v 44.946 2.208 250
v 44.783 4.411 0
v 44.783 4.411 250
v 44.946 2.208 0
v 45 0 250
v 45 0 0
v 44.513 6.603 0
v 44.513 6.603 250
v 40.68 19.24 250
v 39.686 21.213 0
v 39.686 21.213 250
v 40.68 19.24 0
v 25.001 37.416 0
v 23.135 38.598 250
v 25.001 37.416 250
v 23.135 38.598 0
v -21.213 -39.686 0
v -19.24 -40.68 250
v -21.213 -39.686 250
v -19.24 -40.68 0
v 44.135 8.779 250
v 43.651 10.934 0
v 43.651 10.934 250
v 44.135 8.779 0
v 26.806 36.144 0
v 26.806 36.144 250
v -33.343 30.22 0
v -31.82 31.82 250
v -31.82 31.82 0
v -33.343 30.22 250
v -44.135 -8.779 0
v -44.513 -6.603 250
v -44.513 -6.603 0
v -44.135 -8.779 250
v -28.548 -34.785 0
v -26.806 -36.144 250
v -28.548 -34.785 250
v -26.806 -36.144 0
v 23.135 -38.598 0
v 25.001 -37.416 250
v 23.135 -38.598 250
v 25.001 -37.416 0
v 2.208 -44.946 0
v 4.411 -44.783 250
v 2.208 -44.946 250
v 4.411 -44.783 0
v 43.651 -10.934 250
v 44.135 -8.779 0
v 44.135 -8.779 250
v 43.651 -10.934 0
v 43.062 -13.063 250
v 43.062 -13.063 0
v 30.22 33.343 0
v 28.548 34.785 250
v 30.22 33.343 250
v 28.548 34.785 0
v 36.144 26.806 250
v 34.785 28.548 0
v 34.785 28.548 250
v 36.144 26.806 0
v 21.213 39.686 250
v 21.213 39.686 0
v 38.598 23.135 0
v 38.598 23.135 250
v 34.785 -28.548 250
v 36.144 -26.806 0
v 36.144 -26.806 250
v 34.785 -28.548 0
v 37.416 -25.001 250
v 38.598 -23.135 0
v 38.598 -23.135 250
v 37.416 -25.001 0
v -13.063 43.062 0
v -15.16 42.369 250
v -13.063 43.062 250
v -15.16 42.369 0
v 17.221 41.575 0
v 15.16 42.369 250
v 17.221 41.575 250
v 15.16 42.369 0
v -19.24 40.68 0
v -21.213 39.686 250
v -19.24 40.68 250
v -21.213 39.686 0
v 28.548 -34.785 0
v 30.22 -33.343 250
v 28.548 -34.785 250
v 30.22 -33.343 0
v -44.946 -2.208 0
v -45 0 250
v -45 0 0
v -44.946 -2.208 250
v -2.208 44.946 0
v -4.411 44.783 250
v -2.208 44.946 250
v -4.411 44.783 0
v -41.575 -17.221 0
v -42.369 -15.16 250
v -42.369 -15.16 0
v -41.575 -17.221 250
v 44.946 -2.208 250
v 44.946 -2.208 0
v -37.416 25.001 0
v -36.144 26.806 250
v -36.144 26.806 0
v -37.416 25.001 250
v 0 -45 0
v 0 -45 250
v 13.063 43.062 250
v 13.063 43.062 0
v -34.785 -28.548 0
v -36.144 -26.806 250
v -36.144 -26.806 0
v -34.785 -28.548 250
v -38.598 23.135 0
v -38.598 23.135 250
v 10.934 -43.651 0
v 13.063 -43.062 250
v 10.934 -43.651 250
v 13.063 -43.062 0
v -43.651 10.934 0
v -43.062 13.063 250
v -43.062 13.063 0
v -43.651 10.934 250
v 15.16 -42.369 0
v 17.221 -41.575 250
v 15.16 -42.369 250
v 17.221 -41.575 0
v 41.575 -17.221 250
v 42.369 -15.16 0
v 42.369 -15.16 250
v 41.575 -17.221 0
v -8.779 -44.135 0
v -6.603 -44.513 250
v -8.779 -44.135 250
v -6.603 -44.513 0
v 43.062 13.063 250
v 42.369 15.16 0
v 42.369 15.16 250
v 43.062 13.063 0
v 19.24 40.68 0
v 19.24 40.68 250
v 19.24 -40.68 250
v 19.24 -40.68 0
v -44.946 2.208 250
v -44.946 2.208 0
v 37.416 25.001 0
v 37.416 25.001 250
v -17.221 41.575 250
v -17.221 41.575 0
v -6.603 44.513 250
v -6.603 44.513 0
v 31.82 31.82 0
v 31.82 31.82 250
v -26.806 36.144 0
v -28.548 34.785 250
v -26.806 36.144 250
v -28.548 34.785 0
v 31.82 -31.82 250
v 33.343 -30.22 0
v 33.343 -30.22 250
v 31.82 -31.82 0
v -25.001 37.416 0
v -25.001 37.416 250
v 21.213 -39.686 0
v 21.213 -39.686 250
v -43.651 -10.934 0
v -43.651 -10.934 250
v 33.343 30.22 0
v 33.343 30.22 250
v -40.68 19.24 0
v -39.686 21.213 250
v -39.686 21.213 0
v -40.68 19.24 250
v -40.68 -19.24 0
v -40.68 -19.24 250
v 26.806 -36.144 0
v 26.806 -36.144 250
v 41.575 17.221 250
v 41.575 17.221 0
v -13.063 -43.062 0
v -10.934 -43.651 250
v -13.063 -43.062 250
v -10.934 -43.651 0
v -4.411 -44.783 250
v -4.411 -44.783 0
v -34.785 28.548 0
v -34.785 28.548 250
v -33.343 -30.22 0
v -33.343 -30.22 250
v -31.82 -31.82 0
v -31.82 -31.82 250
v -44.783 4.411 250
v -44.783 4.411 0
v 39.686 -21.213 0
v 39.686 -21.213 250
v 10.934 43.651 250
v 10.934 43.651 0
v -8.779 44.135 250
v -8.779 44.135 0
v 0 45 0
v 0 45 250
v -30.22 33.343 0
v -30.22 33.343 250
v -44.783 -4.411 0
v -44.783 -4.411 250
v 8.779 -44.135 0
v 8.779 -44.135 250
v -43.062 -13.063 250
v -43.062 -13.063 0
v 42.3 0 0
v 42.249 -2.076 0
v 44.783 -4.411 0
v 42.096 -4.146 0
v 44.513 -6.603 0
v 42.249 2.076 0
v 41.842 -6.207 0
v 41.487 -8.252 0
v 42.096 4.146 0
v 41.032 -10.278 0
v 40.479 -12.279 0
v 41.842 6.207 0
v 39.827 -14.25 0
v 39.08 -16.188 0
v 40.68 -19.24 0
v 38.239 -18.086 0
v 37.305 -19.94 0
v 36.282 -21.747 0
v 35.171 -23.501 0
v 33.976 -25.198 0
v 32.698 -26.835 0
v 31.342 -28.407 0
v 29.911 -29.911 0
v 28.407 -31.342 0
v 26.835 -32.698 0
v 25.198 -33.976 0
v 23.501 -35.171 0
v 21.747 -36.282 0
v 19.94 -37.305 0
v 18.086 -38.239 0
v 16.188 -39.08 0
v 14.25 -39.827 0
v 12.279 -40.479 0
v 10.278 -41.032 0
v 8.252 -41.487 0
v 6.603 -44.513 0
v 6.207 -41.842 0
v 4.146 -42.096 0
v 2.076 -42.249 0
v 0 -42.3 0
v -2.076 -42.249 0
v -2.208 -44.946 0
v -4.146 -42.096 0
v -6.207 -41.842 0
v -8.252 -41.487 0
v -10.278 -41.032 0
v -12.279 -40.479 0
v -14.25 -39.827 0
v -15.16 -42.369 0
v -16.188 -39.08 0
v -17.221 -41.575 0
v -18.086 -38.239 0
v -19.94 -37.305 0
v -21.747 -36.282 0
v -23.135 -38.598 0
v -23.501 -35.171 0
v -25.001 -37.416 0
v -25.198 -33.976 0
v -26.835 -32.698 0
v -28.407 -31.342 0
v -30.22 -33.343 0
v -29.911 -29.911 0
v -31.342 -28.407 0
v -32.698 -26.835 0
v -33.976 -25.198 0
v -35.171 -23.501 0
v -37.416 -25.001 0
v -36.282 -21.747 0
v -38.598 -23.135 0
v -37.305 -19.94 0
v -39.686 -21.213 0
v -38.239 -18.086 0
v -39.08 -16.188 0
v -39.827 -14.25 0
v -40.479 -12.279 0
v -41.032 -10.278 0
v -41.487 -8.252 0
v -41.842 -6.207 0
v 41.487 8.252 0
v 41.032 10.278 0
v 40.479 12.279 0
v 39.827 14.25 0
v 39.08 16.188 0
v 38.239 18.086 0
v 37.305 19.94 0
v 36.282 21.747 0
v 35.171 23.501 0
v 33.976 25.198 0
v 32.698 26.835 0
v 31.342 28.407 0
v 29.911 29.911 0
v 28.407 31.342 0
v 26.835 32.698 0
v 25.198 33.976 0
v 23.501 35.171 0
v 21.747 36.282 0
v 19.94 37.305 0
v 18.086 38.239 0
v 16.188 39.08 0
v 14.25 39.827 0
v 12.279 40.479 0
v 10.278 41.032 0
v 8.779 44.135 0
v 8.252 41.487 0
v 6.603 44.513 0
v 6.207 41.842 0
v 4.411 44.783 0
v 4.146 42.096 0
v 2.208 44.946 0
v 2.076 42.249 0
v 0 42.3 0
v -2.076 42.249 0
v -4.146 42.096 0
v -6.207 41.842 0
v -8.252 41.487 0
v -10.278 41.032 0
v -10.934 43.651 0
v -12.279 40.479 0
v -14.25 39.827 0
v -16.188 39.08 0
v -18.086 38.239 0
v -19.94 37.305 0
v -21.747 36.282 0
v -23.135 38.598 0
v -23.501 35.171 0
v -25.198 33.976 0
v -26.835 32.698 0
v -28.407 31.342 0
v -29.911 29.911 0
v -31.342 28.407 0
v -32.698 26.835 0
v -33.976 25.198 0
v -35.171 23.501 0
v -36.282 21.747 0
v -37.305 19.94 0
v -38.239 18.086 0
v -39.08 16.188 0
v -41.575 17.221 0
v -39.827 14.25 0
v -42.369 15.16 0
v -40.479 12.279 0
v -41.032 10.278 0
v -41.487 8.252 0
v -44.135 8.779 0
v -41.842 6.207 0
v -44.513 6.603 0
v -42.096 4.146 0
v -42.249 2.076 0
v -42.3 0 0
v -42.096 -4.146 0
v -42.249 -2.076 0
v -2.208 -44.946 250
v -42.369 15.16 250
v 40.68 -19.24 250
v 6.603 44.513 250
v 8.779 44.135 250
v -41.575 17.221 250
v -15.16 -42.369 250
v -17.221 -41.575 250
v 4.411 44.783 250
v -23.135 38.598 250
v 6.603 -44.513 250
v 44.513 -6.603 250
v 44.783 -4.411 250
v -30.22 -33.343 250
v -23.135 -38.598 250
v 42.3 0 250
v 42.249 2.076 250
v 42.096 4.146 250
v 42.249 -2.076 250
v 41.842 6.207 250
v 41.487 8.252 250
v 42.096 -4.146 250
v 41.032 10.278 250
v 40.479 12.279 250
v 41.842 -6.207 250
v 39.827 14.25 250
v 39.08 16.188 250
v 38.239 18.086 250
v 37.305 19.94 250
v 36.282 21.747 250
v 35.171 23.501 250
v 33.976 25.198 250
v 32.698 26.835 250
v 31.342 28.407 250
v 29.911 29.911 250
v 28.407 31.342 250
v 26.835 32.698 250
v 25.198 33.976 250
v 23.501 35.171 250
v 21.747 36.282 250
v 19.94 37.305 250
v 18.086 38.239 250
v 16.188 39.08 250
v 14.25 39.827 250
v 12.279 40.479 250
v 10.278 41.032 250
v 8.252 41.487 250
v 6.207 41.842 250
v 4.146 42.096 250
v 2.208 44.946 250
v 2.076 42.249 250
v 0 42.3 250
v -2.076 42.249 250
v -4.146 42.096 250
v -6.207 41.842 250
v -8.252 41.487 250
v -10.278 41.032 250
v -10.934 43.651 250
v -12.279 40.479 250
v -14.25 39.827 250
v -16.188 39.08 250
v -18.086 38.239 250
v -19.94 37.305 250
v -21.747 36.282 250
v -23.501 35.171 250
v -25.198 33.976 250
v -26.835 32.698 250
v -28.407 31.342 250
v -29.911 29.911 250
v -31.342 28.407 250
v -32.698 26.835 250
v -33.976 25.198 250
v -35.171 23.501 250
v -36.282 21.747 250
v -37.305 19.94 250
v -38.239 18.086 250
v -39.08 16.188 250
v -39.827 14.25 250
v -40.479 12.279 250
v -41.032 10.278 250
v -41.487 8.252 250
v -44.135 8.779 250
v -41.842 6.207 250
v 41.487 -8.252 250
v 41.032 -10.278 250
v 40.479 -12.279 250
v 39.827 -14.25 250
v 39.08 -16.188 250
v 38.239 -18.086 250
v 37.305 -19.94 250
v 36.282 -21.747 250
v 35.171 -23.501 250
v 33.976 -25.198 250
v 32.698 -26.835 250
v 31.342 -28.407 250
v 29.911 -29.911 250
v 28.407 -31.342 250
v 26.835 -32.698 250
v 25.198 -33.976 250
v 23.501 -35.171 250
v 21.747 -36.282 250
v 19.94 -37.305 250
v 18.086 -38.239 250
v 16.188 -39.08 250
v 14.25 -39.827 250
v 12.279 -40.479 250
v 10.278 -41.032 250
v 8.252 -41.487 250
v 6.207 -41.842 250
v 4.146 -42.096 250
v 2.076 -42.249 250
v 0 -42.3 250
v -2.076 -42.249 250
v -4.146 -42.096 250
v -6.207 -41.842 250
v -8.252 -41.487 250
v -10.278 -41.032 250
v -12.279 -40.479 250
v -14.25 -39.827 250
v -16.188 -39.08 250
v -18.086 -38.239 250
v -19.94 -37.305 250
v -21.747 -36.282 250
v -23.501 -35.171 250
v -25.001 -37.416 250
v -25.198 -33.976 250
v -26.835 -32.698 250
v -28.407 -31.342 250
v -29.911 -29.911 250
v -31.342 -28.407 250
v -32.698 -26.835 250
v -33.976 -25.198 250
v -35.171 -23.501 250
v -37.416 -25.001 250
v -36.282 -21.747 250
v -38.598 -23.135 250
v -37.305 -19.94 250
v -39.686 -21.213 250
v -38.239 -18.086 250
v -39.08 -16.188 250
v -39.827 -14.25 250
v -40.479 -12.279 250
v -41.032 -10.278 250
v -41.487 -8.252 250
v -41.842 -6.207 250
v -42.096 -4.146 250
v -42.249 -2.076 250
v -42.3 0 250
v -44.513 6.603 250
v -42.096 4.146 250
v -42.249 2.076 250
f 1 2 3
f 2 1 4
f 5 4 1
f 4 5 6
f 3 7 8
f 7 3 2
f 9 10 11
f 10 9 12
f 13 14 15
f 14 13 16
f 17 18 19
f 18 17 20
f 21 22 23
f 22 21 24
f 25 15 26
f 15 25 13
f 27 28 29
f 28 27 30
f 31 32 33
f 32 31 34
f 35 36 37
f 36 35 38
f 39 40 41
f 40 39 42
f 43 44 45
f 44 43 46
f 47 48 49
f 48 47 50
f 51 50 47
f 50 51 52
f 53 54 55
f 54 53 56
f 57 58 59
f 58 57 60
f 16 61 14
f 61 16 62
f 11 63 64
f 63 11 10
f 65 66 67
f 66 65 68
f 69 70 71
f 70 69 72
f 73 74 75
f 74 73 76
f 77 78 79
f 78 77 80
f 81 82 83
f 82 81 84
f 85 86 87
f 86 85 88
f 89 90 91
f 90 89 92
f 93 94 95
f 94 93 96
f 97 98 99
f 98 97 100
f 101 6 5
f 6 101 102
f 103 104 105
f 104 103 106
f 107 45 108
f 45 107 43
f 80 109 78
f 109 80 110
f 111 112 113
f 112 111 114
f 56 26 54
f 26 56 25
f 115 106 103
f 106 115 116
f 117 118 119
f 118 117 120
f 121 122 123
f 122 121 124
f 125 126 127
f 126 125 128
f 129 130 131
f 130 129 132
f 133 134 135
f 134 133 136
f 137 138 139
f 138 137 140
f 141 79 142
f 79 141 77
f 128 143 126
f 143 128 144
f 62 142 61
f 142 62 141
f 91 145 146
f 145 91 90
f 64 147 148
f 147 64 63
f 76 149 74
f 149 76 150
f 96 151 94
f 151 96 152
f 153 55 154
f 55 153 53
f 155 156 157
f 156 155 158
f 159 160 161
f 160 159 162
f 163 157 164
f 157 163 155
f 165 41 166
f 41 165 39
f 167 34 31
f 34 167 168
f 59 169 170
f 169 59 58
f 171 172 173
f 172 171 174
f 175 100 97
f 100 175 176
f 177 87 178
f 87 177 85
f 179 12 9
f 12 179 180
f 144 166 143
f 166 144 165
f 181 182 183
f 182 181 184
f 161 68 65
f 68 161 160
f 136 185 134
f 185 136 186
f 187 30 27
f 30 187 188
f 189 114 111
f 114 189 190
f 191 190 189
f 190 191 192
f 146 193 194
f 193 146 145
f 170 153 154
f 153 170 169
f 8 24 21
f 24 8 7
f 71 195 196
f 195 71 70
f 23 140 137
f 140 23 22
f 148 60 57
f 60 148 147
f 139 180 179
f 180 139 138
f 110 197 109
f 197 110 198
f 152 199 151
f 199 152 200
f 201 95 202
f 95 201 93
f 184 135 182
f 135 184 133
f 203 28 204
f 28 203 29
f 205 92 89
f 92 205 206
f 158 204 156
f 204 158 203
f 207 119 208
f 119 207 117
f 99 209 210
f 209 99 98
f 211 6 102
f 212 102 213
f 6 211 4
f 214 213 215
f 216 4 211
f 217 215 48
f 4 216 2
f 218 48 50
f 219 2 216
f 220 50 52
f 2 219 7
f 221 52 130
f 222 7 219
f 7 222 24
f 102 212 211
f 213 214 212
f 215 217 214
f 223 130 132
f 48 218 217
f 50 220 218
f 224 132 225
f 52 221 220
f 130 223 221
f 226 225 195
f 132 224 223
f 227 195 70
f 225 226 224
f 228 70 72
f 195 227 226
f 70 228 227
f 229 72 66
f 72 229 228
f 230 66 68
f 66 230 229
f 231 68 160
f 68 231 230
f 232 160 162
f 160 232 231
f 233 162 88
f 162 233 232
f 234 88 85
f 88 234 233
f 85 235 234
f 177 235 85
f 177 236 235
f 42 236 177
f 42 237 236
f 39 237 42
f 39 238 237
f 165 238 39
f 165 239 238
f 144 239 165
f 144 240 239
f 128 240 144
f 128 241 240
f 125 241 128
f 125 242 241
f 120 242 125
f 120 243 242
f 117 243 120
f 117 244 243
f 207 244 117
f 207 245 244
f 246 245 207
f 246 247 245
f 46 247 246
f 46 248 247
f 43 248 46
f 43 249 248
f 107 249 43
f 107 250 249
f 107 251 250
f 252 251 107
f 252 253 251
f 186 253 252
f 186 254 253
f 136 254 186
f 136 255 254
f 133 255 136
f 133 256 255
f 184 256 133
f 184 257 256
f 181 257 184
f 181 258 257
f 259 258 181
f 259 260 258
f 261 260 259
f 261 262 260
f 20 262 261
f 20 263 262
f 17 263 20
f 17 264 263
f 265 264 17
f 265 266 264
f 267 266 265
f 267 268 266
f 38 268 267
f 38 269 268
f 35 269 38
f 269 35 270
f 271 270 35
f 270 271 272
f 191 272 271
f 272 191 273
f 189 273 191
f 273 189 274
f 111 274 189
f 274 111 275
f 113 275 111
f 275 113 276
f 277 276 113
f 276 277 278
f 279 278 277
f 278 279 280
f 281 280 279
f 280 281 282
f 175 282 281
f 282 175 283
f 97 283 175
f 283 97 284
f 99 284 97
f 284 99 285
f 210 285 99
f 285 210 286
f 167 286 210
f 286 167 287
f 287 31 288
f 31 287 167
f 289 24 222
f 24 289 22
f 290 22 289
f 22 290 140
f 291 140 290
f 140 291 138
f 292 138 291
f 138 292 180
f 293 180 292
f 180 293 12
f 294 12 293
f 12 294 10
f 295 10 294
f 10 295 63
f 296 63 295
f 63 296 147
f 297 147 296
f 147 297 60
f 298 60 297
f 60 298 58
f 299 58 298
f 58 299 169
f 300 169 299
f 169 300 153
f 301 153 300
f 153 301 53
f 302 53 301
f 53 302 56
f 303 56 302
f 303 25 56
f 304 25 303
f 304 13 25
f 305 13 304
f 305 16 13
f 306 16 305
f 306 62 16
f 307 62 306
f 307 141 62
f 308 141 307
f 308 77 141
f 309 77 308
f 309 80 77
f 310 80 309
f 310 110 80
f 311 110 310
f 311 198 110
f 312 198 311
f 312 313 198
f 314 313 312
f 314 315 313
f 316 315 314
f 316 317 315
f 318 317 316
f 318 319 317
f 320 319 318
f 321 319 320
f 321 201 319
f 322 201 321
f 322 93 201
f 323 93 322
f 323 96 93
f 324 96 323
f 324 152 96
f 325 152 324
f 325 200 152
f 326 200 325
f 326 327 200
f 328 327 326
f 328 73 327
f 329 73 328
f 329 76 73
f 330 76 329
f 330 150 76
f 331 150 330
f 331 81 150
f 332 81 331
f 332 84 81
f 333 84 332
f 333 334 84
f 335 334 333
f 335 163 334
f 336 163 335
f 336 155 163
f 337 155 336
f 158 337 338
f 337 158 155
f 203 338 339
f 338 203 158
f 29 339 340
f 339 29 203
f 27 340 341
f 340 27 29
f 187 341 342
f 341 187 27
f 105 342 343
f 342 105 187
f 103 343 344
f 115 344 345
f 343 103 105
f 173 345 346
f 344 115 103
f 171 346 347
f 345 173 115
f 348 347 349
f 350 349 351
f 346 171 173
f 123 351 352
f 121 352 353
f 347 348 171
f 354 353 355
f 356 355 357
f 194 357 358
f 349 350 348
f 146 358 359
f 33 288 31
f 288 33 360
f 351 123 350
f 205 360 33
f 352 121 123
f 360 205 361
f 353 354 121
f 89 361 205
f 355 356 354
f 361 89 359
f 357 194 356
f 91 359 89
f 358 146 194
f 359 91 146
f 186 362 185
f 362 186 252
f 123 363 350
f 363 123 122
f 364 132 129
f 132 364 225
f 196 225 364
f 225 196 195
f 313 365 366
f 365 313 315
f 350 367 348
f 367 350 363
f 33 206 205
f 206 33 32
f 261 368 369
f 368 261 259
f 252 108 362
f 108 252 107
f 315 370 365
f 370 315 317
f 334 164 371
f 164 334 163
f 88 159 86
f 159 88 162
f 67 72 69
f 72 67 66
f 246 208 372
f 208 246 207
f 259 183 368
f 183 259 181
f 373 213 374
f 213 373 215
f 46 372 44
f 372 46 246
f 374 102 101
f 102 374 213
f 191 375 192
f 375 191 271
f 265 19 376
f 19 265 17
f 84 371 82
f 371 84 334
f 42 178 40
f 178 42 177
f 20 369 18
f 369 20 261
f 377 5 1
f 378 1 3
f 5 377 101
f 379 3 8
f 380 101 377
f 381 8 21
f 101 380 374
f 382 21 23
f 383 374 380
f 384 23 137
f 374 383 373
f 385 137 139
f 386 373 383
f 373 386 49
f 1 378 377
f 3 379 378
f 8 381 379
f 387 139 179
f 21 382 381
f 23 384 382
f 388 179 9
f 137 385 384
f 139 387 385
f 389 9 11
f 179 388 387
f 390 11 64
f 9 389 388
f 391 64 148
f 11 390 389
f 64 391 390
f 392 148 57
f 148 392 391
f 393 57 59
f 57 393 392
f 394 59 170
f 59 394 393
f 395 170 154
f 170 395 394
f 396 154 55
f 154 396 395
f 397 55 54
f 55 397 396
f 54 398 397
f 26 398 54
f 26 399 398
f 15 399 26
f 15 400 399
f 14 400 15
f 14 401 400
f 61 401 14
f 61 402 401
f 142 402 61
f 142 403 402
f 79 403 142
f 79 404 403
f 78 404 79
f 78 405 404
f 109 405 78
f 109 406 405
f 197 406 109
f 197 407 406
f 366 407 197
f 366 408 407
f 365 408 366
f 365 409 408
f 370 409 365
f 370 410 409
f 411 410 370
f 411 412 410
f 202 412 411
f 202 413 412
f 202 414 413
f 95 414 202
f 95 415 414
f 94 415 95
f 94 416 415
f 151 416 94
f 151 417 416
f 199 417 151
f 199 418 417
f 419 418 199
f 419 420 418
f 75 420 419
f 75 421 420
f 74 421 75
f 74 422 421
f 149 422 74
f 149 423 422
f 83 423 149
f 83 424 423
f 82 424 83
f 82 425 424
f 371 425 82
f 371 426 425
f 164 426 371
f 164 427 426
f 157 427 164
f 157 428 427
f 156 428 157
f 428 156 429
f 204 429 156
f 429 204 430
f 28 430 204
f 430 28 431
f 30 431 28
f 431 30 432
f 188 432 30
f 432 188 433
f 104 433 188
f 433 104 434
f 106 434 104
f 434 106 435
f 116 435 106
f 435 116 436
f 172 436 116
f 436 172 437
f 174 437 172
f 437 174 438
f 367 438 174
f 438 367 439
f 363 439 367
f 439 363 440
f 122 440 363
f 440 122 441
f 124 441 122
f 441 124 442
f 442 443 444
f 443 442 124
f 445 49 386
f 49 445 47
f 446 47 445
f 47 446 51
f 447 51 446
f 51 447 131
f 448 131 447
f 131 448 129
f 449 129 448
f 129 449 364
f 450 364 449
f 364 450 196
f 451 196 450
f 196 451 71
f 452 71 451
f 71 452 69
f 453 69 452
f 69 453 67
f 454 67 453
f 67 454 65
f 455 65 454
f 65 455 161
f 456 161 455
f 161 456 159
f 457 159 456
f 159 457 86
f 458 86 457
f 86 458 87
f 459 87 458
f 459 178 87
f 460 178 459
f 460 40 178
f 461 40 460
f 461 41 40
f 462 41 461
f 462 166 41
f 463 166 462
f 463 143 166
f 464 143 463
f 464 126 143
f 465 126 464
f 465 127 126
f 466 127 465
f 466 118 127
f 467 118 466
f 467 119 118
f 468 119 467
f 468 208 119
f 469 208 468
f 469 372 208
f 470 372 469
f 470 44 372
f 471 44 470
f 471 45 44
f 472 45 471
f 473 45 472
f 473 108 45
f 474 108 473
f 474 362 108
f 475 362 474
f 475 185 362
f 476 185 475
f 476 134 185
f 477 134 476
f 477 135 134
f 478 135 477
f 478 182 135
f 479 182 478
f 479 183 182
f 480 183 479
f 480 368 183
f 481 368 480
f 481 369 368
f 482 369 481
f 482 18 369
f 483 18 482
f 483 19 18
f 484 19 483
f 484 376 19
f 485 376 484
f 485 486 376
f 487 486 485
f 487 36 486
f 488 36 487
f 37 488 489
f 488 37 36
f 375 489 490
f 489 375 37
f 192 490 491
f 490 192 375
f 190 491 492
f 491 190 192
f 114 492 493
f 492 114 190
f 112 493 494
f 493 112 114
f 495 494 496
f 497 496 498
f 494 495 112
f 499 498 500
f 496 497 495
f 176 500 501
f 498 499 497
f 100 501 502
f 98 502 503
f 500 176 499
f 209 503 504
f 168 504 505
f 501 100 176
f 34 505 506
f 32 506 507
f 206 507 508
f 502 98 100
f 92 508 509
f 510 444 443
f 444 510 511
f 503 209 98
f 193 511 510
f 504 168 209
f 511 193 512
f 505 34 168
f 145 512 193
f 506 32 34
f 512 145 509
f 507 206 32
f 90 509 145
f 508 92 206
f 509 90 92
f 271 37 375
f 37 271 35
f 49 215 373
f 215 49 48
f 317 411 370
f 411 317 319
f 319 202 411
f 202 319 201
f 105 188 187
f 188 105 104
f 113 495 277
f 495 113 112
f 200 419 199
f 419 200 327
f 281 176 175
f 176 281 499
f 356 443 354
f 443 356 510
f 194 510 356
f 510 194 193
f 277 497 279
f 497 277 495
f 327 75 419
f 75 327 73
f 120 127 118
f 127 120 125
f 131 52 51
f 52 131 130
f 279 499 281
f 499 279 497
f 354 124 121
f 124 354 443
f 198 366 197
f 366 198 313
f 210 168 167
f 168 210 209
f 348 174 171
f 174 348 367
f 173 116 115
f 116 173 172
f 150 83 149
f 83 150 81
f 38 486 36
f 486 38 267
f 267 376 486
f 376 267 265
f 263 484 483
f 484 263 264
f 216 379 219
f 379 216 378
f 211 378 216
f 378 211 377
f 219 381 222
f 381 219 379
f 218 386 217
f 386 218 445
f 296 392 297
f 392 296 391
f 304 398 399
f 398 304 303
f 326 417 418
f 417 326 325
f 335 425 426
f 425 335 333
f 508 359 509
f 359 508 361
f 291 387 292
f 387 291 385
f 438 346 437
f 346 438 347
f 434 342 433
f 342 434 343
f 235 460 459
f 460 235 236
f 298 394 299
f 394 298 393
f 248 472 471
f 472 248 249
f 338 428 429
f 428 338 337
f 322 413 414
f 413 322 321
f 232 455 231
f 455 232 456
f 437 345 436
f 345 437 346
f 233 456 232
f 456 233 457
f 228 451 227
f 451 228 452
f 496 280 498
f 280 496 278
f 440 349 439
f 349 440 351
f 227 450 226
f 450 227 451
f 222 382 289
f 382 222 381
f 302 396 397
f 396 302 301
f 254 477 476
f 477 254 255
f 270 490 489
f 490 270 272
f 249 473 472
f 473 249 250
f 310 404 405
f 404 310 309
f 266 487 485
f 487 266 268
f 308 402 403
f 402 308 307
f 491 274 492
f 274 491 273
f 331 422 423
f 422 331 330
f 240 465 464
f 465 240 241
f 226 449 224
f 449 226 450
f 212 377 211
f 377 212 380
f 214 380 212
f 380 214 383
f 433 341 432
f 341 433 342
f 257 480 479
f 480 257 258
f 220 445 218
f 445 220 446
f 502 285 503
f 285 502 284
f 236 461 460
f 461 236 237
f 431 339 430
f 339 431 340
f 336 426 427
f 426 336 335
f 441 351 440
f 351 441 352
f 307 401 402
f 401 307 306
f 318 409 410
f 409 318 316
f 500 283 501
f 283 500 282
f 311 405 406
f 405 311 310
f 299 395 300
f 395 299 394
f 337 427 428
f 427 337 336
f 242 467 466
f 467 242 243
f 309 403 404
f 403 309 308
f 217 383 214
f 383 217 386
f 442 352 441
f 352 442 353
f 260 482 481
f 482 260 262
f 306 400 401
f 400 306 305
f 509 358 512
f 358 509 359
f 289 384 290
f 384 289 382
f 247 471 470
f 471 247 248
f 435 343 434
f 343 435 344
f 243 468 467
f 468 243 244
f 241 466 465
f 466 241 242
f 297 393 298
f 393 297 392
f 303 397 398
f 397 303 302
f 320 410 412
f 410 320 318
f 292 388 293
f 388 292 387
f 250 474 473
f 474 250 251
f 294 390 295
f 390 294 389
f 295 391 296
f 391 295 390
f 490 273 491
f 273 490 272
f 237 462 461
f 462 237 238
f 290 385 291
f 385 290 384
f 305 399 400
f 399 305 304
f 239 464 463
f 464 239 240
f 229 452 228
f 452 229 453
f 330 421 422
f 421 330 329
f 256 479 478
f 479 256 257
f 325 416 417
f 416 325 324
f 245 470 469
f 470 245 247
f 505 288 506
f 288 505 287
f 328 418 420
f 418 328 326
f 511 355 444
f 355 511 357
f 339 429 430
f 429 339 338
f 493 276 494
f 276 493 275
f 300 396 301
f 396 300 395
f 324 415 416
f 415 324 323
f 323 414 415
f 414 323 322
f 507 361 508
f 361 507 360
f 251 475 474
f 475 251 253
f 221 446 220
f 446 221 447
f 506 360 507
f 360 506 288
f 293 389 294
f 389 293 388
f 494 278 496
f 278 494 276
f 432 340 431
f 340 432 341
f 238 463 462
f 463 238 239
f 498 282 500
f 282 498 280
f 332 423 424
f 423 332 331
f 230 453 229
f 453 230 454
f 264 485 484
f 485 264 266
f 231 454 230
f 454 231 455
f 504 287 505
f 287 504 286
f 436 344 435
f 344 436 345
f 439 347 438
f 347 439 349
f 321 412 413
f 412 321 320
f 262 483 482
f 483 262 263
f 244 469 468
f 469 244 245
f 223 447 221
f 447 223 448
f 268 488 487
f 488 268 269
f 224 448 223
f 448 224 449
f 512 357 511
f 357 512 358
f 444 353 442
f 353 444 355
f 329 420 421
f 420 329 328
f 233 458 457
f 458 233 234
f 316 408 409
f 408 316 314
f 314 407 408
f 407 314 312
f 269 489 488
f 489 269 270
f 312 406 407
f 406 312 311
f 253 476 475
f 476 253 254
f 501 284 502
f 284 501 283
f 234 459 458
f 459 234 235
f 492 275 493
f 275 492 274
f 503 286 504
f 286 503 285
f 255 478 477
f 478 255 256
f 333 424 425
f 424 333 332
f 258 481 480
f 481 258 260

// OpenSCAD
$fn = 128;

// HT 90 pipe 250 mm (approximation)
// Assumptions (common HT DN90): OD=90mm, wall=2.7mm, length=250mm
// Adjust parameters as needed.

od = 90;
wall = 2.7;
len = 250;

id = od - 2*wall;

difference() {
  cylinder(h=len, d=od, center=false);
  translate([0,0,-0.1])
    cylinder(h=len+0.2, d=id, center=false);
}
